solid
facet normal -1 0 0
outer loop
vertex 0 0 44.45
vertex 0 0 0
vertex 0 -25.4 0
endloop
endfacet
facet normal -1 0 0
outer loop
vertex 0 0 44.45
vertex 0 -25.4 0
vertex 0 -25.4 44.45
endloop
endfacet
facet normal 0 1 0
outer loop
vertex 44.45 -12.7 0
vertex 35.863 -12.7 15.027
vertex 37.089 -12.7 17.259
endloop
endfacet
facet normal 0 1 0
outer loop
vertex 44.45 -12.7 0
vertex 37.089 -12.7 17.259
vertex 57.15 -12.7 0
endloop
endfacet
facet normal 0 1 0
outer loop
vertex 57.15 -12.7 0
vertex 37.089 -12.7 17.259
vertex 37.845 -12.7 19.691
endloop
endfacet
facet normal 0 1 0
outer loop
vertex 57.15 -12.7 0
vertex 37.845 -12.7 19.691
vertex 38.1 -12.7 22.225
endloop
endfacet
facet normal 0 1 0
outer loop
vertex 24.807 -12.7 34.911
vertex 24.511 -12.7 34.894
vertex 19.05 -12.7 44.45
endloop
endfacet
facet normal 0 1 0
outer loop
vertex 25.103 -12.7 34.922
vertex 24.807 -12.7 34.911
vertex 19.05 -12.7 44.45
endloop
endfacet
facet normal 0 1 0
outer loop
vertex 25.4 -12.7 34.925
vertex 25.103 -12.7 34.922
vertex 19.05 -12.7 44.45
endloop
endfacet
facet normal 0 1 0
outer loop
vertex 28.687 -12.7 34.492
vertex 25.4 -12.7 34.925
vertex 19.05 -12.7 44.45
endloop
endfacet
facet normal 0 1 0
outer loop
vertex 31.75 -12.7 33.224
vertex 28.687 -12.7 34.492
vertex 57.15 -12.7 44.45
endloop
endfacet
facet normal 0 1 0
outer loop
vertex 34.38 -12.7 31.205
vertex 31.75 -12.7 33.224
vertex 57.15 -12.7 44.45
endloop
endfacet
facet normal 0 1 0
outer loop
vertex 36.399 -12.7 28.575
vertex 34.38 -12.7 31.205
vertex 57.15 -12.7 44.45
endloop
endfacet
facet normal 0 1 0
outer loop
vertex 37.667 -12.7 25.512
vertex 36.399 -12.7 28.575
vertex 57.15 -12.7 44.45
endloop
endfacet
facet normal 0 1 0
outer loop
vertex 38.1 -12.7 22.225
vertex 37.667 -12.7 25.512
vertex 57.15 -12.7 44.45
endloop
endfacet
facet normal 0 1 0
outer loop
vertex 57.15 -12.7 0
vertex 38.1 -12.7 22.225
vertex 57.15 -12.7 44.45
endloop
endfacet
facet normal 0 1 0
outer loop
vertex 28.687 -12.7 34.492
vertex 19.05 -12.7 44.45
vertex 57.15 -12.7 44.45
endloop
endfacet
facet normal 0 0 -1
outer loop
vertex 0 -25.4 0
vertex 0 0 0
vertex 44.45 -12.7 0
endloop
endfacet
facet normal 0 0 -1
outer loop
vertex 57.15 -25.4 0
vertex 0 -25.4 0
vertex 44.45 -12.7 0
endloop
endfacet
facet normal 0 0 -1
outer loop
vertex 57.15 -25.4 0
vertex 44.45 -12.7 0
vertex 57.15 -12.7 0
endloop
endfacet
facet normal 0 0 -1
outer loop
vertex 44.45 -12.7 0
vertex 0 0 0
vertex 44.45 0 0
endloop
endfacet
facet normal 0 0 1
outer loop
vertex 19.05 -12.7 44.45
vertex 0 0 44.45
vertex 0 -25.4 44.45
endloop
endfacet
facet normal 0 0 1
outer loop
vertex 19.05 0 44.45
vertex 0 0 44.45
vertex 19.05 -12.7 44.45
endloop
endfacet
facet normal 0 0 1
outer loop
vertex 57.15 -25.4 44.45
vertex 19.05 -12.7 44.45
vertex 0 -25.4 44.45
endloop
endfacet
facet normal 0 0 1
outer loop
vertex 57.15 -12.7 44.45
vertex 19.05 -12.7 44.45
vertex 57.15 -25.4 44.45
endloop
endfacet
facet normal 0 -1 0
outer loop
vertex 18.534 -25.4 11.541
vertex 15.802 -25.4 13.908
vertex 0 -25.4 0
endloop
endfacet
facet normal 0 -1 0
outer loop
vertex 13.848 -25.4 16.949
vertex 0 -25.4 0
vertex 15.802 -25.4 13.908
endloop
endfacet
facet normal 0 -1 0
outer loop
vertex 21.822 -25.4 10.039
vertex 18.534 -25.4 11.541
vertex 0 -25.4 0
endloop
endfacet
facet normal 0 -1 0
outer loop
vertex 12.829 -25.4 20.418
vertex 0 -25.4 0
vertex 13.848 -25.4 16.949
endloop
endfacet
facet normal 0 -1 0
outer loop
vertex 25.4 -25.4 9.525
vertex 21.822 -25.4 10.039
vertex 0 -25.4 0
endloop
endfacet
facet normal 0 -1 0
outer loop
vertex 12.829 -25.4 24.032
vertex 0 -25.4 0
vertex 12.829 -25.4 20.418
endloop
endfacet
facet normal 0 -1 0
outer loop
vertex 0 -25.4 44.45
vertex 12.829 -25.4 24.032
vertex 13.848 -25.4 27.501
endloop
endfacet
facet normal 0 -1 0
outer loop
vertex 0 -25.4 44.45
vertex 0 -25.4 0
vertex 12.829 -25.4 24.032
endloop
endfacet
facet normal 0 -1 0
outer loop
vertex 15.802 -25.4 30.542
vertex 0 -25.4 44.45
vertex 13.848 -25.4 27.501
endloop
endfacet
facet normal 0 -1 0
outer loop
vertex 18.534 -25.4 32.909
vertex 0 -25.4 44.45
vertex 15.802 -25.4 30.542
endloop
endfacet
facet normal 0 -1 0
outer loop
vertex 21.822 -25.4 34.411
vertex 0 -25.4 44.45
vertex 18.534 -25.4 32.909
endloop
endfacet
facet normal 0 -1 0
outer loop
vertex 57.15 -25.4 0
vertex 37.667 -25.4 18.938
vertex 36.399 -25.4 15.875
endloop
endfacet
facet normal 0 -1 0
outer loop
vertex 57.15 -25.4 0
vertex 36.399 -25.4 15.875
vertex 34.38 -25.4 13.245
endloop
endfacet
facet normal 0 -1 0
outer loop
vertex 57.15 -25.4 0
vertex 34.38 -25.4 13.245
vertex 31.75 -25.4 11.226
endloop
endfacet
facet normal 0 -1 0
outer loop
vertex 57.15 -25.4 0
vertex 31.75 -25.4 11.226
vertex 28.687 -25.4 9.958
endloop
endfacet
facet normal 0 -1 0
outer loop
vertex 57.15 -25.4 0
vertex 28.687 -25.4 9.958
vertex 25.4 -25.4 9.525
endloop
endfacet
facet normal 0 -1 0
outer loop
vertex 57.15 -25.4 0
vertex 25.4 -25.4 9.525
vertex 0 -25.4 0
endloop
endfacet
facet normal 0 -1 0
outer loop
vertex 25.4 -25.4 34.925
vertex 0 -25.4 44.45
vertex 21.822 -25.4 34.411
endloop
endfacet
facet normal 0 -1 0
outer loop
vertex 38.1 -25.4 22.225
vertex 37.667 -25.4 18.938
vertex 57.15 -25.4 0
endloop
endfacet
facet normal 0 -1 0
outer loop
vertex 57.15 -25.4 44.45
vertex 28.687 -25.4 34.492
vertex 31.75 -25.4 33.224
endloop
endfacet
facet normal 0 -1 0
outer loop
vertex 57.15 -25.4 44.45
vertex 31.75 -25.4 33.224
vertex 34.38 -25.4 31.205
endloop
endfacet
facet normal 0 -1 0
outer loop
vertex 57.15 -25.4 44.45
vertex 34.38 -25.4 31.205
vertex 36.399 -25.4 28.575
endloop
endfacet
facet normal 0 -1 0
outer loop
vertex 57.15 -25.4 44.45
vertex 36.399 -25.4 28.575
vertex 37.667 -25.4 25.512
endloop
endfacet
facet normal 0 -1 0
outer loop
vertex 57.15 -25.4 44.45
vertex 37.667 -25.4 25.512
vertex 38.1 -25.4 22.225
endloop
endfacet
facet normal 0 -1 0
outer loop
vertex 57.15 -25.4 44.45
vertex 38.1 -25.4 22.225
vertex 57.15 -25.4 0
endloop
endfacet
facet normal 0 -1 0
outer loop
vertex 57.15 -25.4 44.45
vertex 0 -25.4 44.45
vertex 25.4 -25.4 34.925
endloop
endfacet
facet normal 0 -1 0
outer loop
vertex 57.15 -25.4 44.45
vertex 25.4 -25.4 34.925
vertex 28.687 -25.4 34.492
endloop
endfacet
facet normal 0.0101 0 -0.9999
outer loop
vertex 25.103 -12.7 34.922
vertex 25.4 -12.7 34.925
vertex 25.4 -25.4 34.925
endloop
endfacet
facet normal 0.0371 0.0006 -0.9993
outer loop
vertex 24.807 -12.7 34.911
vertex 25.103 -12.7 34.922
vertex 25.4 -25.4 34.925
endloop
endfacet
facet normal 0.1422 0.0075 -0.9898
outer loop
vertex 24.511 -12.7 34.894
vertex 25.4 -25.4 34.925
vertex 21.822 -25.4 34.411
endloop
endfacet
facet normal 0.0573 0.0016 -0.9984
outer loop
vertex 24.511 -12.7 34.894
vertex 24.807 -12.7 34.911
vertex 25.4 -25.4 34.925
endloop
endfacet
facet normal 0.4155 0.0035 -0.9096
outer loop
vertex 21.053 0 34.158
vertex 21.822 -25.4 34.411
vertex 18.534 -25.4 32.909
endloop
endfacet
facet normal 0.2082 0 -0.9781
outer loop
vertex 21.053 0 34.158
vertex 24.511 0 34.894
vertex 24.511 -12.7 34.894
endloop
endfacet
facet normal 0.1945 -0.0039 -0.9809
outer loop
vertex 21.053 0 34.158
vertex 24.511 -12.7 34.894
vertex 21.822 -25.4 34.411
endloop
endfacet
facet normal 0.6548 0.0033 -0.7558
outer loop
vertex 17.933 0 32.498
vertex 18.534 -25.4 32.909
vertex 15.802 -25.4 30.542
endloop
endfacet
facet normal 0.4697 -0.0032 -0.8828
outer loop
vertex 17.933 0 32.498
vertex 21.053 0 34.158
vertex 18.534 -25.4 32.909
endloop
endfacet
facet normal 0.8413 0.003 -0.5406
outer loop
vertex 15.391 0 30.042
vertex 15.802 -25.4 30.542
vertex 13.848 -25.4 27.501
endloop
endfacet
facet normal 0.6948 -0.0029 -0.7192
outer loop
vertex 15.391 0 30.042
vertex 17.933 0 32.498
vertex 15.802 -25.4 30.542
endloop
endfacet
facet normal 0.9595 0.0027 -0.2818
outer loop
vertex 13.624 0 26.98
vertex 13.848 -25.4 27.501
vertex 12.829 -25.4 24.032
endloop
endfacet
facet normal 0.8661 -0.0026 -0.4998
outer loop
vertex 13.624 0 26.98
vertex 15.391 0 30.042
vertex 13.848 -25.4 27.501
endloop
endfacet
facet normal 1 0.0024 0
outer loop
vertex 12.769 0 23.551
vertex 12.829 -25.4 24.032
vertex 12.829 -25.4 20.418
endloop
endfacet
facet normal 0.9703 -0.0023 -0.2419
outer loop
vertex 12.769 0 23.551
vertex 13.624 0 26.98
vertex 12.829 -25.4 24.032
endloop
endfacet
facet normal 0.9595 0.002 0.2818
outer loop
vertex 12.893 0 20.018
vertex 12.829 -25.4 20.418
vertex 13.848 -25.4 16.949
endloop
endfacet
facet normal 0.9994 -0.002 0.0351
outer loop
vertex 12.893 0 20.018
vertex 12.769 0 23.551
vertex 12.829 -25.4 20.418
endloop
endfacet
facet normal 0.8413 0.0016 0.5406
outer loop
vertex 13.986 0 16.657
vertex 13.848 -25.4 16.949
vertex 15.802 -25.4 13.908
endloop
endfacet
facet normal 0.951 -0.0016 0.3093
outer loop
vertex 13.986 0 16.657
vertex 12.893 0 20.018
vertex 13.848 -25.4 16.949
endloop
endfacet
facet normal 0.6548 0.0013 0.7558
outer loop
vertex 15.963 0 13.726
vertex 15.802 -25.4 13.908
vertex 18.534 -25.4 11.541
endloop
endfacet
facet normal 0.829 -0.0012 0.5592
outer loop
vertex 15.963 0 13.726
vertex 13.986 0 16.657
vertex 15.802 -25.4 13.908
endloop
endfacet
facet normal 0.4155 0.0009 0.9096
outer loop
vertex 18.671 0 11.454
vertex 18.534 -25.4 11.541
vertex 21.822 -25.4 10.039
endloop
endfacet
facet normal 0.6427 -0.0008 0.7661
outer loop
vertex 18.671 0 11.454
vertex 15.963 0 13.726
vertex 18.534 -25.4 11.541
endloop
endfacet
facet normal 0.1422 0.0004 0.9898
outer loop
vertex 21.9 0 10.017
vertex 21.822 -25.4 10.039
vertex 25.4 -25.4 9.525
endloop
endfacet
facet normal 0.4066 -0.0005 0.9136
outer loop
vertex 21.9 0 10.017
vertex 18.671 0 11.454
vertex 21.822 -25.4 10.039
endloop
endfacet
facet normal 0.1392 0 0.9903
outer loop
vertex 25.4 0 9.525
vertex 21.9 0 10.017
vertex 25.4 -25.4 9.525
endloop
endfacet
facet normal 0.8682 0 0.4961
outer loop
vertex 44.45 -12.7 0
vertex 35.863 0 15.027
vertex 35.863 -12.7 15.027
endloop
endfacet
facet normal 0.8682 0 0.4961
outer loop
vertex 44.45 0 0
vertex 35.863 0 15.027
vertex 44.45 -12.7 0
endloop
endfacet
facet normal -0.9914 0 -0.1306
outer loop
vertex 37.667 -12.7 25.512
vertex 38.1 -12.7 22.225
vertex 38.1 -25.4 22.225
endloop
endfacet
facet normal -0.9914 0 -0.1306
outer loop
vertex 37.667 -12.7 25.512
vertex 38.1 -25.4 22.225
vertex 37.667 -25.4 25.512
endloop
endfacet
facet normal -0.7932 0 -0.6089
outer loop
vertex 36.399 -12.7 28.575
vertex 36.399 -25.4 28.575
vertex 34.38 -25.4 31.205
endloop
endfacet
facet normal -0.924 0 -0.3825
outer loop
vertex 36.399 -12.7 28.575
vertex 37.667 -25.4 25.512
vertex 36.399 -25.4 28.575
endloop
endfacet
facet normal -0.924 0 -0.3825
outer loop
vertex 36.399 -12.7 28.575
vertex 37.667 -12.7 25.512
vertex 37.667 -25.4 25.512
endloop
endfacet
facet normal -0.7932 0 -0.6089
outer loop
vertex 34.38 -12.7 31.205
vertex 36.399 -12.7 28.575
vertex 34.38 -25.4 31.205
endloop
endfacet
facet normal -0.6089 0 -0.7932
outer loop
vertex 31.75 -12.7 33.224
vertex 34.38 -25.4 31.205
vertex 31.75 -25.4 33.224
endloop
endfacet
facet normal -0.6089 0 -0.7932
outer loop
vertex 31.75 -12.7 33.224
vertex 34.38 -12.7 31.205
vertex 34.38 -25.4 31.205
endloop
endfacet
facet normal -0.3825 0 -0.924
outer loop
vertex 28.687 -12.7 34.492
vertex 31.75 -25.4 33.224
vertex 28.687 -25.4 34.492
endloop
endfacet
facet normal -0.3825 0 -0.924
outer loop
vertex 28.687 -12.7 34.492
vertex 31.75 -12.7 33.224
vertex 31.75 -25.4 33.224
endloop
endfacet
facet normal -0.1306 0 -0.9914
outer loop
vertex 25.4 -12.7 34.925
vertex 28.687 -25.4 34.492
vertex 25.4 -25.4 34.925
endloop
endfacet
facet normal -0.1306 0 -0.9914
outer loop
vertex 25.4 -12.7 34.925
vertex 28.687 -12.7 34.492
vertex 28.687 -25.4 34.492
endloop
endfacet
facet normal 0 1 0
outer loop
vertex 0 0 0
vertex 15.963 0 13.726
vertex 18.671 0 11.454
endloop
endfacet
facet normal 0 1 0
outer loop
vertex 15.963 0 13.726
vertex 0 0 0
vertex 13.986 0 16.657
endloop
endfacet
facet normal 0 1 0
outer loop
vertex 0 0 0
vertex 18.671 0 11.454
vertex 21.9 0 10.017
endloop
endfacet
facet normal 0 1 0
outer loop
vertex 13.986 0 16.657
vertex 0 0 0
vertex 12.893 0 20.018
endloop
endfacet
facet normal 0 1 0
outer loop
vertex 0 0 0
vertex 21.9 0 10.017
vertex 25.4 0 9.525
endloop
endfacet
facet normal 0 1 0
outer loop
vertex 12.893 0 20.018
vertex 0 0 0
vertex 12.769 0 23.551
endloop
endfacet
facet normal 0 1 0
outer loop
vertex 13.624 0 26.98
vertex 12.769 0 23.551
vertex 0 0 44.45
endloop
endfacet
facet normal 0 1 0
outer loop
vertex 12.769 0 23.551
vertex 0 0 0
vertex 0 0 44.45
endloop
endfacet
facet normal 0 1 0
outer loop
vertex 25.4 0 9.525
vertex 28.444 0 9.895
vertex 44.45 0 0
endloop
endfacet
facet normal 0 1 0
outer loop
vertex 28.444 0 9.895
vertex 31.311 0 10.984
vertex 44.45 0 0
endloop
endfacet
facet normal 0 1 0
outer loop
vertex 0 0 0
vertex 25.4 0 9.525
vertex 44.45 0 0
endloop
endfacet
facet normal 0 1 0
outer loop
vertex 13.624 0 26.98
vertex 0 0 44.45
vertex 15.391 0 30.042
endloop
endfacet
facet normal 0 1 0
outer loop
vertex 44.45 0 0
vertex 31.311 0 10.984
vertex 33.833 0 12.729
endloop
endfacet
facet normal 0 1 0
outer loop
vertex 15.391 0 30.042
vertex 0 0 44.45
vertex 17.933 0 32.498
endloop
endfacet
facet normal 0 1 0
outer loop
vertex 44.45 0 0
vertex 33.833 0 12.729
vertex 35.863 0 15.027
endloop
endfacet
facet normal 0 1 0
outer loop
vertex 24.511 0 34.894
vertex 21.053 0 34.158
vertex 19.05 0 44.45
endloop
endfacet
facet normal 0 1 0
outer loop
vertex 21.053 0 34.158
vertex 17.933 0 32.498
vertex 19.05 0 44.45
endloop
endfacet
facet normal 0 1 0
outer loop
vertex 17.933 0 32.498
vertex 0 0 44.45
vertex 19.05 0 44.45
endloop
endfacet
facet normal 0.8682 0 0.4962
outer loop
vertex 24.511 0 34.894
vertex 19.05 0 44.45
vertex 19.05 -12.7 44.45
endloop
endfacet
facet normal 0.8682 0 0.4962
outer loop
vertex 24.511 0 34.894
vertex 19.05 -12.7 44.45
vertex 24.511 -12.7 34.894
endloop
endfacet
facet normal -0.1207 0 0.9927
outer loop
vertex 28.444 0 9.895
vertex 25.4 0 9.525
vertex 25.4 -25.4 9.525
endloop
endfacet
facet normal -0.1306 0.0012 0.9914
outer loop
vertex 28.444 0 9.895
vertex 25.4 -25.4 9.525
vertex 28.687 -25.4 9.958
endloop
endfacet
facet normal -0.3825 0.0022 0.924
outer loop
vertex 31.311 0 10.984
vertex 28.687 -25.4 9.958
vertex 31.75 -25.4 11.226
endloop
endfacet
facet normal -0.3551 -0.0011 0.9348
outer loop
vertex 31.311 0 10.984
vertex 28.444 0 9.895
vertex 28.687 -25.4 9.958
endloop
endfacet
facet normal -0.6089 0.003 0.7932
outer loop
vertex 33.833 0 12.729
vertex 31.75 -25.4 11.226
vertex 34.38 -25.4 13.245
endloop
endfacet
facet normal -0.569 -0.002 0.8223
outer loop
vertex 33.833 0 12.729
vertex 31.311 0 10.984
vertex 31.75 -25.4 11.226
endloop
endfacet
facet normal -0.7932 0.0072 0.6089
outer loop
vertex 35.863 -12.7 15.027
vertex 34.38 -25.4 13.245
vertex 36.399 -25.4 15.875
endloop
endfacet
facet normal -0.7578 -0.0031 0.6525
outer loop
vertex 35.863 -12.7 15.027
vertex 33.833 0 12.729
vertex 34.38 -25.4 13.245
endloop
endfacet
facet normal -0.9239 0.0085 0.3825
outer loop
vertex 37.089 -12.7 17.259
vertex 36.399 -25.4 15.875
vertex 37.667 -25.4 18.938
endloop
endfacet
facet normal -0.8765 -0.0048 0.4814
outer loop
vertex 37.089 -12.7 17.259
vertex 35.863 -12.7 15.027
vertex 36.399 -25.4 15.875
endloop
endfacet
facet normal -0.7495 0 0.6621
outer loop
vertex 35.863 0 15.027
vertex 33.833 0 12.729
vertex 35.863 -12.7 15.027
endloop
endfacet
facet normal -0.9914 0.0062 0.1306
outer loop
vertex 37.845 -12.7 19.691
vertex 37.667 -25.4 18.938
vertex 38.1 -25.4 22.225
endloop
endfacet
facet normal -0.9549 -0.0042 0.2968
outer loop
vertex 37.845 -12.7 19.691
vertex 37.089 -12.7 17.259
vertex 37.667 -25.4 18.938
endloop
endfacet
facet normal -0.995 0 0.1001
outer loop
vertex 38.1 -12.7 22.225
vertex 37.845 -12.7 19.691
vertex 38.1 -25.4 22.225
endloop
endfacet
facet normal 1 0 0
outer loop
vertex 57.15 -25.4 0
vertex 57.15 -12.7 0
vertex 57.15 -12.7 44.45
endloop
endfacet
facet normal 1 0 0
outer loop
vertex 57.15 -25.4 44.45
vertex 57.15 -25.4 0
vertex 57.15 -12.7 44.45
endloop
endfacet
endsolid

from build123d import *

# Parameters (mm, degrees)
F0_W     = 57.15
F0_H     = 44.45
F1_DEPTH = 25.4
F3_DEPTH = 12.7
F5_DEPTH = 25.401


with BuildPart() as f1:
    # F0 (on Front) → F1 (new body)
    with BuildSketch(Plane.XZ):
        with Locations((28.575, 22.225)):
            Rectangle(F0_W, F0_H)
    extrude(amount=F1_DEPTH)

    # F2 (on Front) → F3 (cut)
    with BuildSketch(Plane.XZ):
        Polygon((19.05, 44.45), (44.45, 0), (57.15, 0), (57.15, 44.45), align=None)
    extrude(amount=F3_DEPTH, mode=Mode.SUBTRACT)

    # F4 (on Front) → F5 (cut, through all)
    with BuildSketch(Plane.XZ):
        with BuildLine():
            ThreePointArc((38.1, 22.225), (34.380256, 31.205256), (25.4, 34.925))
            Line((25.4, 34.925), (25.4, 9.525))
            ThreePointArc((25.4, 9.525), (34.380256, 13.244744), (38.1, 22.225))
        make_face()
        with BuildLine():
            Line((25.4, 9.525), (25.4, 34.925))
            ThreePointArc((25.4, 34.925), (12.7, 22.225), (25.4, 9.525))
        make_face()
    extrude(amount=F5_DEPTH, mode=Mode.SUBTRACT)


solid = f1.part
